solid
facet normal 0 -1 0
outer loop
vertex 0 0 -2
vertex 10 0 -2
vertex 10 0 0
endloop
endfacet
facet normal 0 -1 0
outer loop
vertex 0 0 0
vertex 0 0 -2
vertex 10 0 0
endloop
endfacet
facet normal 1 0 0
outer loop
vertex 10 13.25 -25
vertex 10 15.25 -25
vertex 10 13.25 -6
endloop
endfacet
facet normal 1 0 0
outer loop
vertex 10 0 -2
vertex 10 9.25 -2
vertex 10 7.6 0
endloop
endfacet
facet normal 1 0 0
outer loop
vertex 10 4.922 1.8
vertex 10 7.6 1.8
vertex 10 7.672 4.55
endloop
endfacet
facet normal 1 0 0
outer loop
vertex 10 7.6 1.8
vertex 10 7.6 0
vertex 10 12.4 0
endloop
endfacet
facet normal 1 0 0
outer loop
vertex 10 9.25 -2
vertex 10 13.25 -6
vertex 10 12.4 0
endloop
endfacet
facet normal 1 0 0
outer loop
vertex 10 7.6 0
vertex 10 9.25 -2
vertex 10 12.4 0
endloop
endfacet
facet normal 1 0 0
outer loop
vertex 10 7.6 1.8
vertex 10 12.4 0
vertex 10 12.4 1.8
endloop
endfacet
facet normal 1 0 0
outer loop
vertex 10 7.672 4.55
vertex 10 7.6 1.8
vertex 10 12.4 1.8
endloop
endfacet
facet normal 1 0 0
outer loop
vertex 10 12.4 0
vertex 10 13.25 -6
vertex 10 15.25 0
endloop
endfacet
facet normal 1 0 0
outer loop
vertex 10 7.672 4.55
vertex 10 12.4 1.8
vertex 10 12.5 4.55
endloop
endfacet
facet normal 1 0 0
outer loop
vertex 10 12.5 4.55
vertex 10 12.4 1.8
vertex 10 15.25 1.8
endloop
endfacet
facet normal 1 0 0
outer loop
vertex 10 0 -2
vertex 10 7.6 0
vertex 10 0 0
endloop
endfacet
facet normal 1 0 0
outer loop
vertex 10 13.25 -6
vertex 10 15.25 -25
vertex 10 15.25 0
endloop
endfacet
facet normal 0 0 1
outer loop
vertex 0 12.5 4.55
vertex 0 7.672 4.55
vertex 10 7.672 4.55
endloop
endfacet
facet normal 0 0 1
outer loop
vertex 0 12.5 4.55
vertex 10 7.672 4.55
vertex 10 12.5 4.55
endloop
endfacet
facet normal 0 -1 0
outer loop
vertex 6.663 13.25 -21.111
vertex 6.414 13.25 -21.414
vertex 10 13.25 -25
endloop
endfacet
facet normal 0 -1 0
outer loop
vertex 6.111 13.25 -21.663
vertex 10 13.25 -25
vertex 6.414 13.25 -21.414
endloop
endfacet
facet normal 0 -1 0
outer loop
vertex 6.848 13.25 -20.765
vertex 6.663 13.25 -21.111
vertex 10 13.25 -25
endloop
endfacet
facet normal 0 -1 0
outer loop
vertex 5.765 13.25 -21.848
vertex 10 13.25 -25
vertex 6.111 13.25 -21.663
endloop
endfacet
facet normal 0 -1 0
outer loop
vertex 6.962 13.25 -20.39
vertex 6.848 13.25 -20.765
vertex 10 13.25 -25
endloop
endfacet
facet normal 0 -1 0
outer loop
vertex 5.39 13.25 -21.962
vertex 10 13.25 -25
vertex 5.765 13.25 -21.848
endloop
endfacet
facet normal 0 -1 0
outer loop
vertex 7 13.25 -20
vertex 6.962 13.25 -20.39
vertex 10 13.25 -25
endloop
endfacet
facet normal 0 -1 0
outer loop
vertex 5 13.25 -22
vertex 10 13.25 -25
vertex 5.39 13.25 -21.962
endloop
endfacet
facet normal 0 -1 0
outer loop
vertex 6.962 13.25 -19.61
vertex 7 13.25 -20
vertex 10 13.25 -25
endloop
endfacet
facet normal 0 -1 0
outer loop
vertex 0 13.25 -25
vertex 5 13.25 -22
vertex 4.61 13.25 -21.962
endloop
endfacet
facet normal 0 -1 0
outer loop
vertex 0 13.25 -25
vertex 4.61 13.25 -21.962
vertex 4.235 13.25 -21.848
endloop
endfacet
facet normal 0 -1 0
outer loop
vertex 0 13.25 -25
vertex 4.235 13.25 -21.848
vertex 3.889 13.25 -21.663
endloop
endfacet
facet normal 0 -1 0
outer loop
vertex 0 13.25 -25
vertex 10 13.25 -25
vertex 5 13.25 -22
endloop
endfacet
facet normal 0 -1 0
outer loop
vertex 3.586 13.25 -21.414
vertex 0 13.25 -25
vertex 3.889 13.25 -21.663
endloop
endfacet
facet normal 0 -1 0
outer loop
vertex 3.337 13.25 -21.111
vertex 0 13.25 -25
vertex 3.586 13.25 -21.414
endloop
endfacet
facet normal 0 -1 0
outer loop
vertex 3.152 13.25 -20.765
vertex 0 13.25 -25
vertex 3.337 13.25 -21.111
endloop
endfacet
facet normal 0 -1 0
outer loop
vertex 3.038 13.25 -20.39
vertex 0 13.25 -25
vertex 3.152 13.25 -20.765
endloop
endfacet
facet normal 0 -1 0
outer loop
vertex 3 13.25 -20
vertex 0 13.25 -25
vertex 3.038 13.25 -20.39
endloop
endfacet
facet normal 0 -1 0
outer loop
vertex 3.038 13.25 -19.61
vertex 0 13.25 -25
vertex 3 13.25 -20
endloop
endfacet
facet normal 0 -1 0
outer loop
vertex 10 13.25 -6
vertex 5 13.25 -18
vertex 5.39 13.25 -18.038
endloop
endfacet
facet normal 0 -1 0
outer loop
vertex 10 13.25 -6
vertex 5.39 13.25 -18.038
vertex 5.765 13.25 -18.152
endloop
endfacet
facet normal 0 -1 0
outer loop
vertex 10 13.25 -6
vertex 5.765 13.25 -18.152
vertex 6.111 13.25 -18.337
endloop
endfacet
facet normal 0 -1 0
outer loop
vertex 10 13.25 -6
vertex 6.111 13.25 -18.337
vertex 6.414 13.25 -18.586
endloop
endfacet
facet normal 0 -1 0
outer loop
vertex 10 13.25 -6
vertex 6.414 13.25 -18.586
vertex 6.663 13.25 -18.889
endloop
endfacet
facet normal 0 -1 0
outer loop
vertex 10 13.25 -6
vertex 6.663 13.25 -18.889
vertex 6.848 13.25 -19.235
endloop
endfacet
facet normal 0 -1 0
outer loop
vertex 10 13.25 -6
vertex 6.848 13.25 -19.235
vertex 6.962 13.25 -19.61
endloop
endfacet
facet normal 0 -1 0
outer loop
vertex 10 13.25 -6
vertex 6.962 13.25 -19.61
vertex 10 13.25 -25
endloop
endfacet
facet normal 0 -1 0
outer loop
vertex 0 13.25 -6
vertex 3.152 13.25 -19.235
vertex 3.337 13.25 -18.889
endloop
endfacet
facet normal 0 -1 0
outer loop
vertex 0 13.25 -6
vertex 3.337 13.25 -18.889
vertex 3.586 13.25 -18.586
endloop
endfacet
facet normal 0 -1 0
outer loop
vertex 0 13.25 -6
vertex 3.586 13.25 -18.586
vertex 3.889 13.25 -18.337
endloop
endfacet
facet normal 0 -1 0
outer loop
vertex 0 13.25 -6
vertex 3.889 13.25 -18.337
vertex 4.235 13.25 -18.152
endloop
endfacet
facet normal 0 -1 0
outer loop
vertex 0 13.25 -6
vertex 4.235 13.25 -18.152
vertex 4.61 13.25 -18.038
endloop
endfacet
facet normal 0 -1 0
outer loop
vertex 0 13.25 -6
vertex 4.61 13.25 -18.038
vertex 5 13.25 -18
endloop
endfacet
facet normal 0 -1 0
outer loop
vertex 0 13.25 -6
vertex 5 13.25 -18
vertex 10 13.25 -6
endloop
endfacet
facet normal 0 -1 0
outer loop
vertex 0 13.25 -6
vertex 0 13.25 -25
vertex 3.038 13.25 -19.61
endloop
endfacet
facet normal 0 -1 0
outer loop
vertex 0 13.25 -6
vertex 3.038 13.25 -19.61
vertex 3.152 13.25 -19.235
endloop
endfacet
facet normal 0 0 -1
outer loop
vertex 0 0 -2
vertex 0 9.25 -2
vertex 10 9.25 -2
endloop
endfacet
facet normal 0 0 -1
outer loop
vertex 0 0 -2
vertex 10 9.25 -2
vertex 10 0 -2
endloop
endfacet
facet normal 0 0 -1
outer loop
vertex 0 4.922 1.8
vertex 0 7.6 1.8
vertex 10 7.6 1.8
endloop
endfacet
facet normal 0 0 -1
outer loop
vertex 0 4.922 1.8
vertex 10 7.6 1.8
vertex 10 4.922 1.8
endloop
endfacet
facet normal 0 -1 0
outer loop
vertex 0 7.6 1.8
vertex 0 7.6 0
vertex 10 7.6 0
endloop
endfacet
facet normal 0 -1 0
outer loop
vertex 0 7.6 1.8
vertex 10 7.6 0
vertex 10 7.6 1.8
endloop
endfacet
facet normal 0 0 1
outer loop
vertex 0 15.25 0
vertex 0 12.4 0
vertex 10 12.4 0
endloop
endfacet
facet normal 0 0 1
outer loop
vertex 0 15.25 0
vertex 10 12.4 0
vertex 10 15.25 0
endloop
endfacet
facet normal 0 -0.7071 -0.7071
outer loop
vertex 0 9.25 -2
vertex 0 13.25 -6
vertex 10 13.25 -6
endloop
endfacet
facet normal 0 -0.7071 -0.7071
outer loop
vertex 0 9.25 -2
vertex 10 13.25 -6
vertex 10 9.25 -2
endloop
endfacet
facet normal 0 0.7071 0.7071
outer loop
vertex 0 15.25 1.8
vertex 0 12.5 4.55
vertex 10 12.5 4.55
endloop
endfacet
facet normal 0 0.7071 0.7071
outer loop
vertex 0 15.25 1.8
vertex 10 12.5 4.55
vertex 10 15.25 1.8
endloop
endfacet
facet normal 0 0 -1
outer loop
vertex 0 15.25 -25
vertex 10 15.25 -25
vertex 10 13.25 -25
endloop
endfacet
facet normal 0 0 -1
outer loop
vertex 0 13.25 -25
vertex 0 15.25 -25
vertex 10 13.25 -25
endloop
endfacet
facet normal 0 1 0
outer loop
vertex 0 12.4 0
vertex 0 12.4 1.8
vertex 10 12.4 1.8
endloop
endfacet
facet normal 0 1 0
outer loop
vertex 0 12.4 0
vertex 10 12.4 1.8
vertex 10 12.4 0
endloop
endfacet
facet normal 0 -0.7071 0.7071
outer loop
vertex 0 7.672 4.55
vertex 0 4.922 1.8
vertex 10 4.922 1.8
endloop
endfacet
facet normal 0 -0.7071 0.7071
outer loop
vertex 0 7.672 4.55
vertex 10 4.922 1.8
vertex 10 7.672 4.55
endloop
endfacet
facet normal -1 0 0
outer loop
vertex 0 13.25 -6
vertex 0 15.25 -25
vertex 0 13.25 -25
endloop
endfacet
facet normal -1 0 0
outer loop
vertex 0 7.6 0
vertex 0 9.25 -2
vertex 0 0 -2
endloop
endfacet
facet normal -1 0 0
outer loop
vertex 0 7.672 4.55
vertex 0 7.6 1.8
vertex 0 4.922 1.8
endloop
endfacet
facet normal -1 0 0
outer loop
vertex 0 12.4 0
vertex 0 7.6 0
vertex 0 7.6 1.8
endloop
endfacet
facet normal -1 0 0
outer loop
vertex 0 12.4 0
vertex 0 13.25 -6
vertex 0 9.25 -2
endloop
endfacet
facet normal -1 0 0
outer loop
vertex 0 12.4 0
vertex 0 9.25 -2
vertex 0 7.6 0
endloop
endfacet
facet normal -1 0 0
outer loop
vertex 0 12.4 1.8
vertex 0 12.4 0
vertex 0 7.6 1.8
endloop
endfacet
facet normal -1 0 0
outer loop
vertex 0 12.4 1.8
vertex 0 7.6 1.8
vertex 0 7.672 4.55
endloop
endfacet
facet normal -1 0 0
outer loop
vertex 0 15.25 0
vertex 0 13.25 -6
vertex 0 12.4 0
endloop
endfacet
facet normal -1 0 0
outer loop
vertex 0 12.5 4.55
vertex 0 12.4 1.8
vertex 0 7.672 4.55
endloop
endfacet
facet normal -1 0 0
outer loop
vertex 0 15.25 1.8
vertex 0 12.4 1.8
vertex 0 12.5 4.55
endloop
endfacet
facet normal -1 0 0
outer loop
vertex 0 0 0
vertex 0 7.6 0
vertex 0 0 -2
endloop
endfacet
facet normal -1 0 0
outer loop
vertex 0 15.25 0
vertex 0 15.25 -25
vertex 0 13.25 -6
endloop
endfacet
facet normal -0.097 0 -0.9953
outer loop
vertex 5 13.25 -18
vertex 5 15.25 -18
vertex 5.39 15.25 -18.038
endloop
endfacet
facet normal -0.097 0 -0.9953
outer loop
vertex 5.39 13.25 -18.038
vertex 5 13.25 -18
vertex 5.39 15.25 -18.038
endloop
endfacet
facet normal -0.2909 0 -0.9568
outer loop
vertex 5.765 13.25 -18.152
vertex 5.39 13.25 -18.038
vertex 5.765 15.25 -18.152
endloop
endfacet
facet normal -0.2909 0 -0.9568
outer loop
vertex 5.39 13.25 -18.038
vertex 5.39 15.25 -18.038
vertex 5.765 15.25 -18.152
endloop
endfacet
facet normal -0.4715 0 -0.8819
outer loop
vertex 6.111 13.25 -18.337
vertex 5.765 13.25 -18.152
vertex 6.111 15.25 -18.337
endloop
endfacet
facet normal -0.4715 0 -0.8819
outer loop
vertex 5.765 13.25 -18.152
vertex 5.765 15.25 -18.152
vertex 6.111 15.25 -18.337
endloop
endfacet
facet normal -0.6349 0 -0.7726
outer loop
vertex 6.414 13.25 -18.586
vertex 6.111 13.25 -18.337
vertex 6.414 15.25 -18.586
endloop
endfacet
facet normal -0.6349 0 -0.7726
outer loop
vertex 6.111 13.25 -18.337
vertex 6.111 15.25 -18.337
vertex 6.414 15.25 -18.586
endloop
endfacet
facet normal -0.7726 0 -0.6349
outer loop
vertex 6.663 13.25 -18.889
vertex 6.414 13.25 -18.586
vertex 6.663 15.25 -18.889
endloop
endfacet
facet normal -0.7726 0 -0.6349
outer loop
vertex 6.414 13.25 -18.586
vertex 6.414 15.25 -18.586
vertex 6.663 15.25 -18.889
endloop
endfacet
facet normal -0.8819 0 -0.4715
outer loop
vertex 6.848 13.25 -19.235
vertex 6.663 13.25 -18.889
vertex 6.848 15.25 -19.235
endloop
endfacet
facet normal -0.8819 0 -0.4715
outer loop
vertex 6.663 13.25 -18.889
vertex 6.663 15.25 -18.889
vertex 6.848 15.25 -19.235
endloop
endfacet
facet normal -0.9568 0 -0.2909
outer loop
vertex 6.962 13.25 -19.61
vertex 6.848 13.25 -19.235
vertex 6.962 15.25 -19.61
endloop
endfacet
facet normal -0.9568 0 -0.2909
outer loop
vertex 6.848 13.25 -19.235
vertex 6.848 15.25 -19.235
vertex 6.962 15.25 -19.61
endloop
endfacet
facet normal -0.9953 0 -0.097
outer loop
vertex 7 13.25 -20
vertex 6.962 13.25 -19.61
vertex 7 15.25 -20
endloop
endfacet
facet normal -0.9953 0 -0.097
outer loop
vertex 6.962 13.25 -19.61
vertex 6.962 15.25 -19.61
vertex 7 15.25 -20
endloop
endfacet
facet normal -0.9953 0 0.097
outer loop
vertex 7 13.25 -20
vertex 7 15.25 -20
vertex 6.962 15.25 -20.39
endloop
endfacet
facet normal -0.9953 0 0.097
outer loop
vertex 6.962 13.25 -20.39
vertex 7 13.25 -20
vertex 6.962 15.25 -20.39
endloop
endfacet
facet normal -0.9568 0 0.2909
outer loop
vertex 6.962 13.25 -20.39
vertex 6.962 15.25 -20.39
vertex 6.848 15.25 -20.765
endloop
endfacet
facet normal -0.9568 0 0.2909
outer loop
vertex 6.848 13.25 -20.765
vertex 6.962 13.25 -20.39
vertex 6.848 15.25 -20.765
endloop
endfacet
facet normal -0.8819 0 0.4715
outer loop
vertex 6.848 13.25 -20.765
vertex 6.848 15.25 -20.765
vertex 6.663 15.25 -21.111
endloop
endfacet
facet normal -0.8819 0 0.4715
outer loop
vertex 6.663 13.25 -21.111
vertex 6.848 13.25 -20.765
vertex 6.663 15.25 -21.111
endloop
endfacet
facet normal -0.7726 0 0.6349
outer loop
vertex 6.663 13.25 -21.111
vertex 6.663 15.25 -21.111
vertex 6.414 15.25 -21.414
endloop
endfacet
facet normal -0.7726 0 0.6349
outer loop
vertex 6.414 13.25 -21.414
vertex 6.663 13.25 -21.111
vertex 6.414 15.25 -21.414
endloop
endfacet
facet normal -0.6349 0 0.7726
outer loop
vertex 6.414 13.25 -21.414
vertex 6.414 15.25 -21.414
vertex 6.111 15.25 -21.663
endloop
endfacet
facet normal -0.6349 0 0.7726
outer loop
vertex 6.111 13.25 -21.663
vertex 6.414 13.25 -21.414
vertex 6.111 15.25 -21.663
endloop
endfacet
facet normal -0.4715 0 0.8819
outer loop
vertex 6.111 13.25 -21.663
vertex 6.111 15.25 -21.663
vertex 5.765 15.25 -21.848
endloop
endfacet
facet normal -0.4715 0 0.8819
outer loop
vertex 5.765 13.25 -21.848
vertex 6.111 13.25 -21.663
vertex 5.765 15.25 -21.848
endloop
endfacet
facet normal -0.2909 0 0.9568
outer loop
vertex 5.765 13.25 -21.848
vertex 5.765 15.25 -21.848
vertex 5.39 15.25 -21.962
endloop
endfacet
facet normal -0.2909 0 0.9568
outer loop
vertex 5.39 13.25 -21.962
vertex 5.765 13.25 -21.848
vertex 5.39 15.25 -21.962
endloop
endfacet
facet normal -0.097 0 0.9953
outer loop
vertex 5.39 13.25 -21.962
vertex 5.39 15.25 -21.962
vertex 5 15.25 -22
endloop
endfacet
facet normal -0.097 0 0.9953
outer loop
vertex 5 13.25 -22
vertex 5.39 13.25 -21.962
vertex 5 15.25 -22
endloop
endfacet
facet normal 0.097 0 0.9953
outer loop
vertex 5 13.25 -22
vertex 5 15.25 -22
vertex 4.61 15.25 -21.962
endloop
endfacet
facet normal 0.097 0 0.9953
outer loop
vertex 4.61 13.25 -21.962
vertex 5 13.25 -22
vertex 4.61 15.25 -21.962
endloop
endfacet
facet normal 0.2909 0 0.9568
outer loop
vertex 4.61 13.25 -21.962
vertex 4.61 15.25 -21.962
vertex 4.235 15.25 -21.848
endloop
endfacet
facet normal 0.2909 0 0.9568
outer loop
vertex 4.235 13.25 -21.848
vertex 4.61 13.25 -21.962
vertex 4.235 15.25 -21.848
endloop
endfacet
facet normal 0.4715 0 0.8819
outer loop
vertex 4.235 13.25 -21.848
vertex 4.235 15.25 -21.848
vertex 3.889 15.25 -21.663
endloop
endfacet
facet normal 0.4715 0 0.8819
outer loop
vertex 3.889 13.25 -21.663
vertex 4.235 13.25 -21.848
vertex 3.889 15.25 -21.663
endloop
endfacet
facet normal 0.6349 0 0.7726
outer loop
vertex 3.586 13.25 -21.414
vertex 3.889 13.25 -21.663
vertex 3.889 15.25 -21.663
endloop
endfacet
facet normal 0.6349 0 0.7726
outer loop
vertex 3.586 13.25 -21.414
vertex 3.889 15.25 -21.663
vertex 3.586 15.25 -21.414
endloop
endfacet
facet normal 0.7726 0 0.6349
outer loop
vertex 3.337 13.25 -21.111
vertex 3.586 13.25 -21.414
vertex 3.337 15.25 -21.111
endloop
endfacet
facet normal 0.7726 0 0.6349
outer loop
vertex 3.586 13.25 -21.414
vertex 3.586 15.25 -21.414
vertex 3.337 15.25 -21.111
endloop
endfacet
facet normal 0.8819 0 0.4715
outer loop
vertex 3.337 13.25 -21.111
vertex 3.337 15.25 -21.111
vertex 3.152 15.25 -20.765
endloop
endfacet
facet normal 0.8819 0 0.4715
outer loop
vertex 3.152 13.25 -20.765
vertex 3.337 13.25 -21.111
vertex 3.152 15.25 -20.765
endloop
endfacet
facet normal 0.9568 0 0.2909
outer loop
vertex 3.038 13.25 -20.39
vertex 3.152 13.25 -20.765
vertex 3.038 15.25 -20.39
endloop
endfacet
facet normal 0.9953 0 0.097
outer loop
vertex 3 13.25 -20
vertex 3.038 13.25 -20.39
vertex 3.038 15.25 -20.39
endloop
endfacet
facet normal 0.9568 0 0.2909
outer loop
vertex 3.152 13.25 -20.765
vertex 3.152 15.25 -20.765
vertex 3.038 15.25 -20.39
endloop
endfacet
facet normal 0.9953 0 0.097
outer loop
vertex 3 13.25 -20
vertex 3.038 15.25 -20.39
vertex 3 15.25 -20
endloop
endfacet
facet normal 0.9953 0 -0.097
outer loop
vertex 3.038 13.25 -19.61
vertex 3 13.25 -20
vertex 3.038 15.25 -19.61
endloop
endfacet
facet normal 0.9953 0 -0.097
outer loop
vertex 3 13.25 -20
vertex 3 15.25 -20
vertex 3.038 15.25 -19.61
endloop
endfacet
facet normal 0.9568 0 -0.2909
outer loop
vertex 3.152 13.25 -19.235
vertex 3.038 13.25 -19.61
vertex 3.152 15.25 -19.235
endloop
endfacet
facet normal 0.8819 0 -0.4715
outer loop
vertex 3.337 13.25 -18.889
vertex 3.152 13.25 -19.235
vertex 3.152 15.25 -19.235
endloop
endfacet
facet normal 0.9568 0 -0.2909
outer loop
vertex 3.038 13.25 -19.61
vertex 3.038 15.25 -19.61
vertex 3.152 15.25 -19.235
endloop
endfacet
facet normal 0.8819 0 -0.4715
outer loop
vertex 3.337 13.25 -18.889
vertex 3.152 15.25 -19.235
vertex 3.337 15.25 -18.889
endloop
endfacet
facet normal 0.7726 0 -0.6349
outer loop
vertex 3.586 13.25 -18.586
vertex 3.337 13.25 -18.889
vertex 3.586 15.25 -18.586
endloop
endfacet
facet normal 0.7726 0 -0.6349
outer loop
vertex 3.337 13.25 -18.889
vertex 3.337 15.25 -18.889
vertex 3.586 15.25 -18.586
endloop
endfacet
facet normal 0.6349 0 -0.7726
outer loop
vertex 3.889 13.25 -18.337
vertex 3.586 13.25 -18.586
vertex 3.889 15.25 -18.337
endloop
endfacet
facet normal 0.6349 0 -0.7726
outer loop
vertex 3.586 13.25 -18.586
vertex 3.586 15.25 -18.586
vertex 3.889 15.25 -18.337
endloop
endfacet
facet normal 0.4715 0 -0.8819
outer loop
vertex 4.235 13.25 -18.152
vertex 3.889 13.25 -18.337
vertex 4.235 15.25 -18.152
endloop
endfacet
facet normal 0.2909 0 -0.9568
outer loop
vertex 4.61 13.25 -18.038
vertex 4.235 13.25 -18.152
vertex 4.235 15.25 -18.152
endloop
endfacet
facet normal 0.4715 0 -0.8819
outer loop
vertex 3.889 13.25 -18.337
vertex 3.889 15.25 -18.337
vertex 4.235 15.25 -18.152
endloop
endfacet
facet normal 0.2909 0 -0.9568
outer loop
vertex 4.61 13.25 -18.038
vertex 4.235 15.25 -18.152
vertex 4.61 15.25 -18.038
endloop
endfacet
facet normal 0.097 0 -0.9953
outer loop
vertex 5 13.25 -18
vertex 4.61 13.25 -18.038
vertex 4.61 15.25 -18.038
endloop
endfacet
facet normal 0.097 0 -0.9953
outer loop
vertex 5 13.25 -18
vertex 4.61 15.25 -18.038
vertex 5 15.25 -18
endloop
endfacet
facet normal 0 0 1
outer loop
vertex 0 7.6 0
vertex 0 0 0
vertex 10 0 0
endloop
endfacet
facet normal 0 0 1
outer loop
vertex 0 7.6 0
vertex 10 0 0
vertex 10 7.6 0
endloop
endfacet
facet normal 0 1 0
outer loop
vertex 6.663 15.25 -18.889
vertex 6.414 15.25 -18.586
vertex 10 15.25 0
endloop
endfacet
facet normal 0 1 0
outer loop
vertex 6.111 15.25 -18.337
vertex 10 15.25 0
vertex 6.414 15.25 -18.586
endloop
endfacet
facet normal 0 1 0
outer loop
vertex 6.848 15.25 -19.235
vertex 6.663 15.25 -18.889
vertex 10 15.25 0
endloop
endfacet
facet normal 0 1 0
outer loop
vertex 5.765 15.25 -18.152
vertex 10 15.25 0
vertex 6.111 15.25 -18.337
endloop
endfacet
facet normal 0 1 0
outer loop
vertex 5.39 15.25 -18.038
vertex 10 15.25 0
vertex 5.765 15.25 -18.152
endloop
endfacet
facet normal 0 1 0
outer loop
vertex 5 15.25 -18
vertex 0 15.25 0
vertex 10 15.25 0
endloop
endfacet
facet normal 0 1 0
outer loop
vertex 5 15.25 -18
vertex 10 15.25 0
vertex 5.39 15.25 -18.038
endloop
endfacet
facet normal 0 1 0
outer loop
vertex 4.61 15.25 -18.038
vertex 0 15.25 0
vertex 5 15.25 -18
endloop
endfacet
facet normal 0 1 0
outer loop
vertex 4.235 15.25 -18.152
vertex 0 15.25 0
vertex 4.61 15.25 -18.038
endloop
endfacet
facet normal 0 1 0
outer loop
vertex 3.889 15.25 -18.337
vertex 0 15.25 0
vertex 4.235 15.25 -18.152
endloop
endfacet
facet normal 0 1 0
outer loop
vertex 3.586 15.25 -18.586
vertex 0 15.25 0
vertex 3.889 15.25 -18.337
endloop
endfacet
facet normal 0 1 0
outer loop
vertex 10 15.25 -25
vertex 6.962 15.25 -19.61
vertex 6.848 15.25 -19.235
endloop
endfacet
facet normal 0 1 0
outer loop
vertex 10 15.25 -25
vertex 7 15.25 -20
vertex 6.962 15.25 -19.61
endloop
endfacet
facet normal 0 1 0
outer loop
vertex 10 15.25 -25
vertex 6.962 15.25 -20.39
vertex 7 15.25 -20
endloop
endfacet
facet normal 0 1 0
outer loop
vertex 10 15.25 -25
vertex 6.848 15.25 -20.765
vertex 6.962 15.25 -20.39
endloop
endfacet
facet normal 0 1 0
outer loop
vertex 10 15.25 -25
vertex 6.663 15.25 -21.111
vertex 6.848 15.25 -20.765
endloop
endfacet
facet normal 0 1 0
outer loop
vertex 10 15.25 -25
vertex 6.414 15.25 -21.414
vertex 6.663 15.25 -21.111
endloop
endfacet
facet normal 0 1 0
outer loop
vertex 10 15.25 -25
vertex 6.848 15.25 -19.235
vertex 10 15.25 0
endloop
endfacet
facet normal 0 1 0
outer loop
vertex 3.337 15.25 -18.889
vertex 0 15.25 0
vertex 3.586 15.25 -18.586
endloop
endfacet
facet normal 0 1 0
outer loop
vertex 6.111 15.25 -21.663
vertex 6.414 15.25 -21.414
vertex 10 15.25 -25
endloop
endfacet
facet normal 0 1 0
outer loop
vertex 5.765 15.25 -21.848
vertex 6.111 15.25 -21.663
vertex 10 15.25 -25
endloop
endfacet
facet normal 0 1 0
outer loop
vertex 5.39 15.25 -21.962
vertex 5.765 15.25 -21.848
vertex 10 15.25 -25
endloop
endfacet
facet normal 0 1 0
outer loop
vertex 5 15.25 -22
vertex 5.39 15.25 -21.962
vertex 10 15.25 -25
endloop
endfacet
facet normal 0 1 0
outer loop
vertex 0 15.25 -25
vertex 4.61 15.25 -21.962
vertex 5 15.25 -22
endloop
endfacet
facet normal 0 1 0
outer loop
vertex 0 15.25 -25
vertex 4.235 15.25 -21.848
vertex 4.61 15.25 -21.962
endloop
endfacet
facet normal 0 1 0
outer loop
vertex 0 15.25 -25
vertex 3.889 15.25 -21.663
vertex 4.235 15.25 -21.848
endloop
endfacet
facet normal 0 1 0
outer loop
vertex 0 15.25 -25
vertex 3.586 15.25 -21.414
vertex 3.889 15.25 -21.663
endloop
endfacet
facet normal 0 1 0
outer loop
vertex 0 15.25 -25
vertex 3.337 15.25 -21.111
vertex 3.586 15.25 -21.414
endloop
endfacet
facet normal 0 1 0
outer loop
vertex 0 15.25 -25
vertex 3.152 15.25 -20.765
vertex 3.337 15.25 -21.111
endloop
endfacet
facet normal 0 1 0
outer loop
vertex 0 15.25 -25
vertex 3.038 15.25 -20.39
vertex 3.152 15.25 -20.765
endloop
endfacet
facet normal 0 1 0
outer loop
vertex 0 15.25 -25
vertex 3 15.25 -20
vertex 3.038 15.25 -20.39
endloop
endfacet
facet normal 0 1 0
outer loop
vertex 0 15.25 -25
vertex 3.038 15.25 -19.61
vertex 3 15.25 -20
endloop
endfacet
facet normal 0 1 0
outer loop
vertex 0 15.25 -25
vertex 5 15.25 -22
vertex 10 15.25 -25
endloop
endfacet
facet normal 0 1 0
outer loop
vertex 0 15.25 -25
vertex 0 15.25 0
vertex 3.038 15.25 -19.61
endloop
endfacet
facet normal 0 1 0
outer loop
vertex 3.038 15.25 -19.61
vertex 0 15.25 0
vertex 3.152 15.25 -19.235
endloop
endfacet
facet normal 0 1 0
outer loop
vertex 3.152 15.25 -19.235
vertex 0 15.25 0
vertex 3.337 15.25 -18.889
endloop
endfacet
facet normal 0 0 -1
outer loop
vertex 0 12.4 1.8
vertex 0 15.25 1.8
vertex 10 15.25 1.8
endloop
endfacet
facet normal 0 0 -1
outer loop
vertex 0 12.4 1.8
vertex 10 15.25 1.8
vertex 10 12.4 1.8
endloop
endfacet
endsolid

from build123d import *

# Parameters (mm, degrees)
BOSS_EXTRUDE2_DEPTH = 10
SKETCH2_R           = 2
CUT_EXTRUDE9_DEPTH  = 3


with BuildPart() as part:
    # Sketch1 → Boss-Extrude2 (new body)
    with BuildSketch(Plane(origin=(0, 0, 0), x_dir=(0, 0, -1), z_dir=(1, 0, 0))):
        Polygon((0, 0), (0, 7.6), (-1.8, 7.6), (-1.8, 4.921680622), (-4.55, 7.671680622), (-4.55, 12.5), (-1.8, 15.25), (-1.8, 12.4), (0, 12.4), (0, 15.25), (25, 15.25), (25, 13.25), (6, 13.25), (2, 9.25), (2, 0), align=None)
    extrude(amount=BOSS_EXTRUDE2_DEPTH)

    # Sketch2 → Cut-Extrude9 (cut)
    with BuildSketch(Plane(origin=(0, 15.25, 0), x_dir=(1, 0, 0), z_dir=(0, 1, 0))):
        with Locations(Location((5, 20, 0), (0, 0, 270))):
            Circle(SKETCH2_R)
    extrude(amount=-CUT_EXTRUDE9_DEPTH, mode=Mode.SUBTRACT)


solid = part.part
